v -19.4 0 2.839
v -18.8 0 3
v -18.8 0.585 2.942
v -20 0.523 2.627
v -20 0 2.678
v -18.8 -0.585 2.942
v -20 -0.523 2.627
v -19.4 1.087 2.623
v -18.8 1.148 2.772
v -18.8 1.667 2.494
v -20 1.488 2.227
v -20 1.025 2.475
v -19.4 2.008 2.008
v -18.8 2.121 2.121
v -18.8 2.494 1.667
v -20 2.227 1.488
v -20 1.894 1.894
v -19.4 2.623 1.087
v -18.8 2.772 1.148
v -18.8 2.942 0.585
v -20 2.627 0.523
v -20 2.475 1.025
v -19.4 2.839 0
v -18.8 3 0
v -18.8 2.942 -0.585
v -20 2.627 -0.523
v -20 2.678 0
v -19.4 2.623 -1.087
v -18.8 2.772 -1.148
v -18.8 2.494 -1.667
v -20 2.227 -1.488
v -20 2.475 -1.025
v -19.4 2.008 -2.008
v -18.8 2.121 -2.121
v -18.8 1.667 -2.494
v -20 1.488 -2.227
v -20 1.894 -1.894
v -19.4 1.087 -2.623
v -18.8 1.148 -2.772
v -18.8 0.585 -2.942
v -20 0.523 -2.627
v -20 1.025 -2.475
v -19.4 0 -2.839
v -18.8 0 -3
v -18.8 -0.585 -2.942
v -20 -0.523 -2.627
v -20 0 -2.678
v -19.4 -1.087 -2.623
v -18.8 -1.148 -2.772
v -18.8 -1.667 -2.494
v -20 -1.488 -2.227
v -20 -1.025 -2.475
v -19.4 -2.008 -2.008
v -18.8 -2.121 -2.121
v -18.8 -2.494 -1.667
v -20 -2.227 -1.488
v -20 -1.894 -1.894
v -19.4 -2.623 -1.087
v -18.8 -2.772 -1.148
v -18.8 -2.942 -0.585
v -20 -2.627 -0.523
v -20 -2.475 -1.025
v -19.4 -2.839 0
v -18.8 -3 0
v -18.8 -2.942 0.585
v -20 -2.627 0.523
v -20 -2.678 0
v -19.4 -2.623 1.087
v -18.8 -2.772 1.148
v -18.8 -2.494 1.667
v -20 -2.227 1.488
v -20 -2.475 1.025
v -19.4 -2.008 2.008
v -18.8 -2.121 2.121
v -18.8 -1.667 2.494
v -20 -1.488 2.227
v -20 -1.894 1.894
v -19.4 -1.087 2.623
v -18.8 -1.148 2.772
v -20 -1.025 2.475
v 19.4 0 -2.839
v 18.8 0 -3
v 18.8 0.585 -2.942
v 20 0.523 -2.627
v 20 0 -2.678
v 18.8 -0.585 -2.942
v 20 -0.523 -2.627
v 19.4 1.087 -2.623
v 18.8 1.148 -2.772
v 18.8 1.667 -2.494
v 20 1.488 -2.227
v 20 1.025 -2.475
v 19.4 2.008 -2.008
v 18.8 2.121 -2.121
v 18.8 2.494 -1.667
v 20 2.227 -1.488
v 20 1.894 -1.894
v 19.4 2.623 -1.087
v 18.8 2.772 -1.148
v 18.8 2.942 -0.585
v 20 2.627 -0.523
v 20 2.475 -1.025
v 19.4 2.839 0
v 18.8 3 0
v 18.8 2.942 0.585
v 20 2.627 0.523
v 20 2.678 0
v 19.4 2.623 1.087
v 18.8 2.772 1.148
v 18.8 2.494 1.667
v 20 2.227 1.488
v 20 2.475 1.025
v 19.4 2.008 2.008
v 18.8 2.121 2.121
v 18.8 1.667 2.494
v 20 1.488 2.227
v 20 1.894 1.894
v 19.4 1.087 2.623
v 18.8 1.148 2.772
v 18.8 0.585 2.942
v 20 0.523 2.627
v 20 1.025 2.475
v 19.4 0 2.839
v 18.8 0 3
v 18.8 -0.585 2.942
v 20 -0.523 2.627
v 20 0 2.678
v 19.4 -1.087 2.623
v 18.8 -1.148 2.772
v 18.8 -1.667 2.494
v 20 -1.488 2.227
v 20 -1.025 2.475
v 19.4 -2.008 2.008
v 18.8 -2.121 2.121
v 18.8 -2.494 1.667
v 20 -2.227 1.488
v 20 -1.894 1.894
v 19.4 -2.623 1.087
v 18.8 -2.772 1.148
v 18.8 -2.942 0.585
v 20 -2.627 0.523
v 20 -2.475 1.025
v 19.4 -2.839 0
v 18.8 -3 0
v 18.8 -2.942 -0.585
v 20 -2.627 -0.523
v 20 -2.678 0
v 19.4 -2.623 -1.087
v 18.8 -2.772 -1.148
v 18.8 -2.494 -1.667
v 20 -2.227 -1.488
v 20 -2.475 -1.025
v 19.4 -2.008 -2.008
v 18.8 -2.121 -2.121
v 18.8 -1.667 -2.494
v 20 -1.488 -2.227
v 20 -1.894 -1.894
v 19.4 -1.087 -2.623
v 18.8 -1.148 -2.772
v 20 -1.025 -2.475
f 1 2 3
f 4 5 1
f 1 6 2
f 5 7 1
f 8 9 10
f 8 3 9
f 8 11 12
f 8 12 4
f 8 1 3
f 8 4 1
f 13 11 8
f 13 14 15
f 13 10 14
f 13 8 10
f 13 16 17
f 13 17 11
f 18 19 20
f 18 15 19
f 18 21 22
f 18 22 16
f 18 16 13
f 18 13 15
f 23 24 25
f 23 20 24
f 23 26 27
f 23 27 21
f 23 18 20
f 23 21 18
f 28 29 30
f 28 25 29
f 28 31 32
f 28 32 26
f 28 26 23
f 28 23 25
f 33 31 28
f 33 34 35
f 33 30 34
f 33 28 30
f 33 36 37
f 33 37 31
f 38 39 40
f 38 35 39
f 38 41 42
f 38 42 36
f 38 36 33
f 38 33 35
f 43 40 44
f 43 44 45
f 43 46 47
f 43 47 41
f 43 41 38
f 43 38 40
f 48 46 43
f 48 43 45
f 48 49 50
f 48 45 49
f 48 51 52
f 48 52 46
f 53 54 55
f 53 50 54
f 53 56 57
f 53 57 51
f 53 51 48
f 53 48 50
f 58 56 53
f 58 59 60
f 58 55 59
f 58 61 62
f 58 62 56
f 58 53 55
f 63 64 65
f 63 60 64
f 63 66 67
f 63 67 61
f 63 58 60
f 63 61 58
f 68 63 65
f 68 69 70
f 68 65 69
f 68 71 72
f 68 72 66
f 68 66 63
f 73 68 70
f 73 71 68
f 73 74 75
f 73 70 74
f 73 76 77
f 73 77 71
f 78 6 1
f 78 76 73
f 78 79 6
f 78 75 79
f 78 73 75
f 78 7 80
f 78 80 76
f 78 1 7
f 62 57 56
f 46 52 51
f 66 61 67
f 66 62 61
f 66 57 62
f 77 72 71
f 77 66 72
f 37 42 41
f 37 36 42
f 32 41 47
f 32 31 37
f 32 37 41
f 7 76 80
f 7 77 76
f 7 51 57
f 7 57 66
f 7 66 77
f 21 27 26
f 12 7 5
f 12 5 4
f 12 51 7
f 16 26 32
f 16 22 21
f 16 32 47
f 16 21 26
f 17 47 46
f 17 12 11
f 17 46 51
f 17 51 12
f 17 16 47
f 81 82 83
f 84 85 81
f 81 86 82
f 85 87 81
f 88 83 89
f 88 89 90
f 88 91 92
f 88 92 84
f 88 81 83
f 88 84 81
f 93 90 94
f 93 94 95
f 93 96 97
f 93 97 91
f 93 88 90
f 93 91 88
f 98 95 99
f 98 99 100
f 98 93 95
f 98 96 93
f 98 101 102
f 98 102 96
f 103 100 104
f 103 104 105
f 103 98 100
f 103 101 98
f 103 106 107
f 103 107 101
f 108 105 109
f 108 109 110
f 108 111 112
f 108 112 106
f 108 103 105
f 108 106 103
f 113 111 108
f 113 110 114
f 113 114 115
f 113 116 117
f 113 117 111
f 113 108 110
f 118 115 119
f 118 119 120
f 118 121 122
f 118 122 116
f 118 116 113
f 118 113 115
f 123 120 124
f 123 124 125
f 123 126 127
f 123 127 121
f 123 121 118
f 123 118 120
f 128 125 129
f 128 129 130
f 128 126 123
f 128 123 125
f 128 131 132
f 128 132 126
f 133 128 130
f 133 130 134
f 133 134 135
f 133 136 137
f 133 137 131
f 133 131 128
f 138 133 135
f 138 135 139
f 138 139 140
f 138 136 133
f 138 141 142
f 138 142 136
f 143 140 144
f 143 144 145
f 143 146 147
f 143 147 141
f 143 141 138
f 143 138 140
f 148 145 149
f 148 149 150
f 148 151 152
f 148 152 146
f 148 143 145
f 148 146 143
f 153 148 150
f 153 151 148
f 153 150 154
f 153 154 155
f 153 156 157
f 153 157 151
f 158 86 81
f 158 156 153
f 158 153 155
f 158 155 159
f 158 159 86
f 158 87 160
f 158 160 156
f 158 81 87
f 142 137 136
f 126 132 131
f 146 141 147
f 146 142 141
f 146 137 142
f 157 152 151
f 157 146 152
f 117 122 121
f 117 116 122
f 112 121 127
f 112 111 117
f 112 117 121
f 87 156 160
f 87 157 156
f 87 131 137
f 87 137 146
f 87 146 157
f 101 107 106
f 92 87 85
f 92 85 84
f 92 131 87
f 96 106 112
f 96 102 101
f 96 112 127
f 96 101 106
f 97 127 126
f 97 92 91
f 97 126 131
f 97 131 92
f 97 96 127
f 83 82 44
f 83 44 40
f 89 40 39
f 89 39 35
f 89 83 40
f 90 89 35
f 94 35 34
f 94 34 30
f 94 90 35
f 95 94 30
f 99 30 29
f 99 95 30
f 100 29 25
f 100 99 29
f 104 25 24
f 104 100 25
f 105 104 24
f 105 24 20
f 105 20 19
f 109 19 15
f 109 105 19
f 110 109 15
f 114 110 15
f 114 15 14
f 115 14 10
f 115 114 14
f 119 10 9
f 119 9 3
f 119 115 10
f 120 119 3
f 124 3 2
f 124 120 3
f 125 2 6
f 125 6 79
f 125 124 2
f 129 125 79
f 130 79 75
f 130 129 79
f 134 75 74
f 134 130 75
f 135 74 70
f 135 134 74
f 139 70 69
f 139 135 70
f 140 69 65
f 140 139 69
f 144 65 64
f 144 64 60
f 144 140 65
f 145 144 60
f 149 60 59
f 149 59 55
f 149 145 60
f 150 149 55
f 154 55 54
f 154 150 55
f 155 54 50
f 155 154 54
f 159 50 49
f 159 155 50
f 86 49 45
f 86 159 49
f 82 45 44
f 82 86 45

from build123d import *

# Parameters (mm, degrees)
SKETCH2_R           = 3
EXTRUDE1_DEPTH      = 18.8
EXTRUDE1_DEPTH_BACK = 18.8
SKETCH3_R           = 3
EXTRUDE2_DEPTH      = 1.2
EXTRUDE2_TAPER      = 15
SKETCH4_R           = 3
EXTRUDE3_DEPTH      = 1.2
EXTRUDE3_TAPER      = 15


with BuildPart() as part:
    # Sketch2 → Extrude1 (new body, two sides)
    with BuildSketch(Plane(origin=(0, 0, 0), x_dir=(0, 0, -1), z_dir=(1, 0, 0))) as extrude1_sk:
        Circle(SKETCH2_R)
    extrude(amount=EXTRUDE1_DEPTH)
    extrude(extrude1_sk.sketch, amount=-EXTRUDE1_DEPTH_BACK)

    # Sketch3 → Extrude2 (add)
    with BuildSketch(Plane(origin=(18.8, 0, 0), x_dir=(0, 0, -1), z_dir=(1, 0, 0))):
        Circle(SKETCH3_R)
    extrude(amount=EXTRUDE2_DEPTH, taper=EXTRUDE2_TAPER)

    # Sketch4 → Extrude3 (add)
    with BuildSketch(Plane.ZY.offset(18.8)):
        Circle(SKETCH4_R)
    extrude(amount=EXTRUDE3_DEPTH, taper=EXTRUDE3_TAPER)


solid = part.part
